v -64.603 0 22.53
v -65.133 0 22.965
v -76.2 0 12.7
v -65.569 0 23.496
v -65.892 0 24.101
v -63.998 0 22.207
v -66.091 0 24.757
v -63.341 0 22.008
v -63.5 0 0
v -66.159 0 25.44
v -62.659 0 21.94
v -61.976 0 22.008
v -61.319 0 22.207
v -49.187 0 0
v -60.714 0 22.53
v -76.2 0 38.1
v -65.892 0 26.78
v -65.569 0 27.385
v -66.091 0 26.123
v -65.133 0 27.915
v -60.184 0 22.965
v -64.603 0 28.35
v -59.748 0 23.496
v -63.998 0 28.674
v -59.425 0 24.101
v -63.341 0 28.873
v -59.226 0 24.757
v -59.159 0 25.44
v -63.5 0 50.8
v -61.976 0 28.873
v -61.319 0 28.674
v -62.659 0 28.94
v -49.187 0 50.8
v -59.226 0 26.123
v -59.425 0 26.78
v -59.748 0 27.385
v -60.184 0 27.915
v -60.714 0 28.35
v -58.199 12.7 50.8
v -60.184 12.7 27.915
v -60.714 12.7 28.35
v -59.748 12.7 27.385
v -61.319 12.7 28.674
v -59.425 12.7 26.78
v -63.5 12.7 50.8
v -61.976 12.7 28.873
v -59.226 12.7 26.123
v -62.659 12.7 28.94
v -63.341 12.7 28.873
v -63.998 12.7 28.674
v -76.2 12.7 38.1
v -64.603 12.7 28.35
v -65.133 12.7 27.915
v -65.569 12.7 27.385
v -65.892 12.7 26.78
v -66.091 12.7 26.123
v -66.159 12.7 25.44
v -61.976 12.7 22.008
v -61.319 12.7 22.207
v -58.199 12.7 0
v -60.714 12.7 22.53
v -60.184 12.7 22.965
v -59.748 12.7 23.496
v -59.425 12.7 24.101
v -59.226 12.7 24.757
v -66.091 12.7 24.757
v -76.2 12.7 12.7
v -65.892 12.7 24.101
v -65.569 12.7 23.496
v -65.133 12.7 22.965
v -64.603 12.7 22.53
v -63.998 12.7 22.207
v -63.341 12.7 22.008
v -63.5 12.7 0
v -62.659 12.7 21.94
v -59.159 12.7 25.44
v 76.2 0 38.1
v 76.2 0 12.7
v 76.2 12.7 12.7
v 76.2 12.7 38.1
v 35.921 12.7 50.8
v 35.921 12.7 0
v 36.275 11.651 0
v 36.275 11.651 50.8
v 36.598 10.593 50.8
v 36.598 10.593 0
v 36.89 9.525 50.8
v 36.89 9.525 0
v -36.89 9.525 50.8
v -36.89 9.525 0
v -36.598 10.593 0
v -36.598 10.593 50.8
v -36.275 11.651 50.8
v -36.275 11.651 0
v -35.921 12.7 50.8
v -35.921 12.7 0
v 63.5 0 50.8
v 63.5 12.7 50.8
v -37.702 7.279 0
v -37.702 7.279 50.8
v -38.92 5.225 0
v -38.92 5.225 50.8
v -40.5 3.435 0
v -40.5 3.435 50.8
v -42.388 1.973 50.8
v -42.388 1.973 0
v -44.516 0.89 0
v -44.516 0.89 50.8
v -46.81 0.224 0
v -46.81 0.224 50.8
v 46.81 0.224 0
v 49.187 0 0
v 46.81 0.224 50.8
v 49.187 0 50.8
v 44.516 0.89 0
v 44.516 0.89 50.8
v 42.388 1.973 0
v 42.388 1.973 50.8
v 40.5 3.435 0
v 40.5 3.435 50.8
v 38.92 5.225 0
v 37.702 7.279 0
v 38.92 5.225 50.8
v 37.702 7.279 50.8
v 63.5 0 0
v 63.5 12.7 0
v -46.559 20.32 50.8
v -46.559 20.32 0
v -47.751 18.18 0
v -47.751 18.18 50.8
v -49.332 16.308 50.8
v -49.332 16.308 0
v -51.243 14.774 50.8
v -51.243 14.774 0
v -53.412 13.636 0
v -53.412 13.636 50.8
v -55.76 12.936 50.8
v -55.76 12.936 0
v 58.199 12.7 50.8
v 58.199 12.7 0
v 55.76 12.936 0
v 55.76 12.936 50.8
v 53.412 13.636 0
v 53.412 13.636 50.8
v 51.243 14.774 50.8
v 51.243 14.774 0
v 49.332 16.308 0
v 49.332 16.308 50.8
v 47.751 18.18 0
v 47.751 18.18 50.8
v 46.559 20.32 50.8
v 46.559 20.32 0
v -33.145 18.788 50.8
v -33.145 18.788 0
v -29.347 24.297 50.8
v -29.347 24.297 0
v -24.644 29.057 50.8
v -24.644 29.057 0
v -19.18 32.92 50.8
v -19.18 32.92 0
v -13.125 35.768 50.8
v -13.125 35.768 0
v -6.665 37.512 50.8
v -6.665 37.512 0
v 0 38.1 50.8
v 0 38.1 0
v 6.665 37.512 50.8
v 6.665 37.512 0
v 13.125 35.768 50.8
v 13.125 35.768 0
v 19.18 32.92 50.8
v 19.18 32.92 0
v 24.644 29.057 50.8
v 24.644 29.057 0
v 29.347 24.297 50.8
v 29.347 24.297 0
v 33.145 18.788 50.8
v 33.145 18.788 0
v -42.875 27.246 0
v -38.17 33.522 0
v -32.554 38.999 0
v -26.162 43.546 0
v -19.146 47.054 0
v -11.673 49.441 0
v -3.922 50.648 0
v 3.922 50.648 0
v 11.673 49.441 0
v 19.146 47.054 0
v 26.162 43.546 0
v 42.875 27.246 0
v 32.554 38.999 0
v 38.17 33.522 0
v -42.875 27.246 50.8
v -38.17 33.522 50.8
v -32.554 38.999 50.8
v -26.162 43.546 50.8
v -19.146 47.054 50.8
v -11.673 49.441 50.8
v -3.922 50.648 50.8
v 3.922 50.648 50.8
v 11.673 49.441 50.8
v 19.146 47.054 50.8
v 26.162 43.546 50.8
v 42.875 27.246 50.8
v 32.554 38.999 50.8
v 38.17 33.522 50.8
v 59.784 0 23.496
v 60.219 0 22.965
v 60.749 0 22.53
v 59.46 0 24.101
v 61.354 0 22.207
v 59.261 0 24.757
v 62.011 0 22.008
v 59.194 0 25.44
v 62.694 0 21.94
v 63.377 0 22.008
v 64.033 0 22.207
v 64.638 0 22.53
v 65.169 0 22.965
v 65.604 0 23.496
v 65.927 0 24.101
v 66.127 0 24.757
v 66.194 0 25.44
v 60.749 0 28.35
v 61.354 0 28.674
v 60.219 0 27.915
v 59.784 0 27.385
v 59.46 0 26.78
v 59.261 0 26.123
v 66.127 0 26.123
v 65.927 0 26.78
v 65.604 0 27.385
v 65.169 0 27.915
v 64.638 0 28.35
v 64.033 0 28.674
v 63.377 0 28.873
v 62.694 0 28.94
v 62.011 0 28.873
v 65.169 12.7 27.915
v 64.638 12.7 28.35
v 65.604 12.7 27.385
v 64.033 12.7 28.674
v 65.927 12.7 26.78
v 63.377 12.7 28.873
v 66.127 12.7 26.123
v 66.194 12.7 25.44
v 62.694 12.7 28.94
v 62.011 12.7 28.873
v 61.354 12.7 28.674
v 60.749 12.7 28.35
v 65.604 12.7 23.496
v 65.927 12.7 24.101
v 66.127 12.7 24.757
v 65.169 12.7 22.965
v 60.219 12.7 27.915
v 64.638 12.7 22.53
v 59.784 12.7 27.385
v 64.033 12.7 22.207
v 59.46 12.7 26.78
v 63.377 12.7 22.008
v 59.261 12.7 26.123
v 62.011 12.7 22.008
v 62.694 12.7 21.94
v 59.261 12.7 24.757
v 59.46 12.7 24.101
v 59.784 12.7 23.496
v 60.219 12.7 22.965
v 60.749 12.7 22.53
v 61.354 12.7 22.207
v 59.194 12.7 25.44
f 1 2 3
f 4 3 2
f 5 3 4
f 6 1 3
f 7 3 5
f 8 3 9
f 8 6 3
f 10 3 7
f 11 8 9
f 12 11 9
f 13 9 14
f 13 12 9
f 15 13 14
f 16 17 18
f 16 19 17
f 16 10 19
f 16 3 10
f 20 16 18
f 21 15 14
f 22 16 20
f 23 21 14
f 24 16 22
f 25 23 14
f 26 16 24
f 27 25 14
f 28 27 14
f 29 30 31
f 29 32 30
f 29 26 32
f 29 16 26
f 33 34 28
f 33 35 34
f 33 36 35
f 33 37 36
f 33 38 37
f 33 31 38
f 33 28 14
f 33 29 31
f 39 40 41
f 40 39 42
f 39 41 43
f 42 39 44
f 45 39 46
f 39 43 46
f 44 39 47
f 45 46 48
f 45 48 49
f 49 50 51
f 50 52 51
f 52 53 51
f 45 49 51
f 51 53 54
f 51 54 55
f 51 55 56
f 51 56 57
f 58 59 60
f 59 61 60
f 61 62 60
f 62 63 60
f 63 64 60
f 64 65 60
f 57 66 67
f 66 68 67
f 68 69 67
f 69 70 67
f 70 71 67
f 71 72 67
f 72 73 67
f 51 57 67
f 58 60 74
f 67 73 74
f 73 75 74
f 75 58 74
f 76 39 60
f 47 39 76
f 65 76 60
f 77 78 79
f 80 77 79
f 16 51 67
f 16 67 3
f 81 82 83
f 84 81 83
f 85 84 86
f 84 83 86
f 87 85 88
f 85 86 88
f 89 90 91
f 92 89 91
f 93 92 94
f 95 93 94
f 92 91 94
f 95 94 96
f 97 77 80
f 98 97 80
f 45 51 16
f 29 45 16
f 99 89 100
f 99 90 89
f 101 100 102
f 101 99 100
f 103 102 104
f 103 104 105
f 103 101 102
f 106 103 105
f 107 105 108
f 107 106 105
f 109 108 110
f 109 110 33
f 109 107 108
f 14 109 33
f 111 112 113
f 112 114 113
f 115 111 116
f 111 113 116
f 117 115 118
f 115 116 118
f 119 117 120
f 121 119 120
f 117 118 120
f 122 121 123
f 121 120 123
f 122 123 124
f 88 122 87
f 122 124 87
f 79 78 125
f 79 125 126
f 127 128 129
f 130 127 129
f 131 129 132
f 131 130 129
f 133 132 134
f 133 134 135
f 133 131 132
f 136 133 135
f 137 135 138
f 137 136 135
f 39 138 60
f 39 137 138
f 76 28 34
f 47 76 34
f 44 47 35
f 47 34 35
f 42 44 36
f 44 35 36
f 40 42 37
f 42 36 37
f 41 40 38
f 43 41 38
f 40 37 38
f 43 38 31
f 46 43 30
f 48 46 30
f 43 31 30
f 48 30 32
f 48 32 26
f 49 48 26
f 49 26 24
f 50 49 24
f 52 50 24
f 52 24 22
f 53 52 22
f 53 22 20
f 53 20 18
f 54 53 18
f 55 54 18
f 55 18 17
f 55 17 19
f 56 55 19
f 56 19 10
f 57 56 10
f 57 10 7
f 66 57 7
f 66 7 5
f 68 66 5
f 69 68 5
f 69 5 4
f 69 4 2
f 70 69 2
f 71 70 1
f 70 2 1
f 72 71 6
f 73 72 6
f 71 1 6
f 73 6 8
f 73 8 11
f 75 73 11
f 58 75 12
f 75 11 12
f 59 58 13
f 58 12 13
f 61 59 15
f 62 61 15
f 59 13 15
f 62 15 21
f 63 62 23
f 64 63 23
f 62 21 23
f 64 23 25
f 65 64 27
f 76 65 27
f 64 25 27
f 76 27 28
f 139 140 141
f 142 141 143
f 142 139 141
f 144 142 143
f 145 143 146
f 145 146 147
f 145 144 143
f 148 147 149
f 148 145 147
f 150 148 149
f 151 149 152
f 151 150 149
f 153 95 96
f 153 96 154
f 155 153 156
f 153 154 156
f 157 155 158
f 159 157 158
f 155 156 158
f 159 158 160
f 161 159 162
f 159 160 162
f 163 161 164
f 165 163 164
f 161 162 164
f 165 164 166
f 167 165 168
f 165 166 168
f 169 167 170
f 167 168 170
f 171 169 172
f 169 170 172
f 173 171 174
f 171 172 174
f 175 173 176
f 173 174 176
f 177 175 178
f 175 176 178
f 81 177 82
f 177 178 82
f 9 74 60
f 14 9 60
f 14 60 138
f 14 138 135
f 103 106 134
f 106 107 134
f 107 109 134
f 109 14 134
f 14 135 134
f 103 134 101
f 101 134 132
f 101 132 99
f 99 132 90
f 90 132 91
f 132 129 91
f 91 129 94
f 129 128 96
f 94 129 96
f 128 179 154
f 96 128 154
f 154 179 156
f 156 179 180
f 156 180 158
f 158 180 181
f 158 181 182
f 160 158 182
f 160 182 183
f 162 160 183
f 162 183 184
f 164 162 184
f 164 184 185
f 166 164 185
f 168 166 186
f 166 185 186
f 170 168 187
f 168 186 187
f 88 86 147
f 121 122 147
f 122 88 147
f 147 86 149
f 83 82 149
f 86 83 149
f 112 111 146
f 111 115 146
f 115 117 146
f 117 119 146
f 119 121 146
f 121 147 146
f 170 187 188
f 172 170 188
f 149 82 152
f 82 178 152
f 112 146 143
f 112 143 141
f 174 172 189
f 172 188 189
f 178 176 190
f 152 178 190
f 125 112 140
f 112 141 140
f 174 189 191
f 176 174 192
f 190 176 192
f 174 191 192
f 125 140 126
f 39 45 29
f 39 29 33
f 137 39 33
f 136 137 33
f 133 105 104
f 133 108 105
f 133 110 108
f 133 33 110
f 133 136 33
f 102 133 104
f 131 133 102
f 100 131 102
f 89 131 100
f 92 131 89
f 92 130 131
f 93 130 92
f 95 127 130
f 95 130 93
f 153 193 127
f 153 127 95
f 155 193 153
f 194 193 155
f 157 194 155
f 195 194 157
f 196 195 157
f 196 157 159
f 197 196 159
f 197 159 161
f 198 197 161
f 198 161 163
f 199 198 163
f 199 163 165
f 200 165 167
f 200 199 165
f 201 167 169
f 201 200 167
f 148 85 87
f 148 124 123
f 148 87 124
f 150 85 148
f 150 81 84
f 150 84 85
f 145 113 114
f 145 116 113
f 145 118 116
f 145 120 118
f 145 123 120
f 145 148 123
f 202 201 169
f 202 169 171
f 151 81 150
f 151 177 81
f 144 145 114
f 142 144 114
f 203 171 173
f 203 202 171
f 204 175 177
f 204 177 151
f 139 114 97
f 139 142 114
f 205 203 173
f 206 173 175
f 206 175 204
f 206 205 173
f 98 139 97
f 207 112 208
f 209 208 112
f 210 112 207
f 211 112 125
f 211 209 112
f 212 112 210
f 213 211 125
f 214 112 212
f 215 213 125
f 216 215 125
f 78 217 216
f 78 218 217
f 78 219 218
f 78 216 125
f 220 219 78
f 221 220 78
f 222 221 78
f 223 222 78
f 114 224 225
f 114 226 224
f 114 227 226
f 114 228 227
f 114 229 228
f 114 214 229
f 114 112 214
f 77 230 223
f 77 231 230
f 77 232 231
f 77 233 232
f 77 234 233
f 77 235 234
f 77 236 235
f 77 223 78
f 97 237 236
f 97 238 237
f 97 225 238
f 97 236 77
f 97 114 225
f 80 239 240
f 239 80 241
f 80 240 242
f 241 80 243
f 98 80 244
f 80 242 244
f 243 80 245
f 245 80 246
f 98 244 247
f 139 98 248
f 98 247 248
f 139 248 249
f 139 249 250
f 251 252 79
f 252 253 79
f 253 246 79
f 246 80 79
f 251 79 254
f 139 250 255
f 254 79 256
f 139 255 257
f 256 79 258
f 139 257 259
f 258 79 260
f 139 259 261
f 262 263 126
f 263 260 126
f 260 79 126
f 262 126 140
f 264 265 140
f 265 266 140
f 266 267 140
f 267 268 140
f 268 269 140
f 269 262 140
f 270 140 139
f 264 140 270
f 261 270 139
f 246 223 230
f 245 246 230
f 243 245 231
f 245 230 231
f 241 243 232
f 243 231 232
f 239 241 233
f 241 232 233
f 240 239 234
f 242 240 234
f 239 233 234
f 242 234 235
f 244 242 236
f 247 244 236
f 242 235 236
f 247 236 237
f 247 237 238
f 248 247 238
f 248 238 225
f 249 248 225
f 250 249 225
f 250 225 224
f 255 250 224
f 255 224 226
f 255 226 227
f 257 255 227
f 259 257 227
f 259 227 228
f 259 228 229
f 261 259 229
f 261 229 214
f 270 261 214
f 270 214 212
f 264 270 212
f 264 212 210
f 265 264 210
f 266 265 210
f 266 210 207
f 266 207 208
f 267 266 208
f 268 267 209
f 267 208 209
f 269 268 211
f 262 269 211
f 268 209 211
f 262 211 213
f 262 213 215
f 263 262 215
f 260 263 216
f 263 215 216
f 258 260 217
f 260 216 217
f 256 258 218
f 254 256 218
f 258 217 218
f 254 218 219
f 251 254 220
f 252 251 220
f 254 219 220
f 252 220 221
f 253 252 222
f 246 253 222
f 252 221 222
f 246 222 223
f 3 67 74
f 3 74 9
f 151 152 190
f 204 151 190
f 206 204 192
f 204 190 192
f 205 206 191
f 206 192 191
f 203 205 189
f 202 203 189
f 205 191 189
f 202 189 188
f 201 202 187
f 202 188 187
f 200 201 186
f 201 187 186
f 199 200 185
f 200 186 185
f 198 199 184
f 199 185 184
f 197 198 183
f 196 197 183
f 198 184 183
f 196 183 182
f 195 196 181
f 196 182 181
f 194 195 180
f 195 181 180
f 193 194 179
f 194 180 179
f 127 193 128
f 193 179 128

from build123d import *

# Parameters (mm, degrees)
F1_DEPTH  = 50.8
F3_DEPTH  = 12.7
F4_SIZE   = 12.7
F5_R      = 11.35
F5_R_2    = 10
F6_DEPTH  = 44.45
F7_R      = 12.7
F8_R      = 3.5
F9_DEPTH  = 50.801
F10_W     = 183.8439181447
F10_H     = 157.3934331536
F11_DEPTH = 114.3
F12_R     = 12.7


with BuildPart() as f1:
    # F0 (on Top) → F1 (new body)
    with BuildSketch(Plane.XY):
        with BuildLine():
            ThreePointArc((-35.9210244843, 12.7), (0, 38.1), (35.9210244843, 12.7))
            Line((35.9210244843, 12.7), (49.1868884968, 12.7))
            ThreePointArc((49.1868884968, 12.7), (0, 50.8), (-49.1868884968, 12.7))
            Line((-49.1868884968, 12.7), (-35.9210244843, 12.7))
        make_face()
        with BuildLine():
            ThreePointArc((-49.1868884968, -12.7), (-50.8, 0), (-49.1868884968, 12.7))
            Line((-49.1868884968, 12.7), (-76.2, 12.7))
            Line((-76.2, 12.7), (-76.2, -12.7))
            Line((-76.2, -12.7), (-49.1868884968, -12.7))
        make_face()
        with BuildLine():
            ThreePointArc((-35.9210244843, -12.7), (-38.1, 0), (-35.9210244843, 12.7))
            Line((-35.9210244843, 12.7), (-49.1868884968, 12.7))
            ThreePointArc((-49.1868884968, 12.7), (-50.8, 0), (-49.1868884968, -12.7))
            Line((-49.1868884968, -12.7), (-35.9210244843, -12.7))
        make_face()
        with BuildLine():
            ThreePointArc((35.9210244843, 12.7), (37.5513051228, 6.4427853895), (38.1, 0))
            ThreePointArc((38.1, 0), (37.5513051228, -6.4427853895), (35.9210244843, -12.7))
            Line((35.9210244843, -12.7), (49.1868884968, -12.7))
            ThreePointArc((49.1868884968, -12.7), (50.3951085704, -6.4010180581), (50.8, 0))
            ThreePointArc((50.8, 0), (50.3951085704, 6.4010180581), (49.1868884968, 12.7))
            Line((49.1868884968, 12.7), (35.9210244843, 12.7))
        make_face()
        with BuildLine():
            Line((76.2, 12.7), (49.1868884968, 12.7))
            ThreePointArc((49.1868884968, 12.7), (50.3951085704, 6.4010180581), (50.8, 0))
            ThreePointArc((50.8, 0), (50.3951085704, -6.4010180581), (49.1868884968, -12.7))
            Line((49.1868884968, -12.7), (76.2, -12.7))
            Line((76.2, -12.7), (76.2, 12.7))
        make_face()
        with BuildLine():
            ThreePointArc((-19.05, -32.9955678842), (-29.2989914869, -24.3552683798), (-35.9210244843, -12.7))
            Line((-35.9210244843, -12.7), (-49.1868884968, -12.7))
            ThreePointArc((-49.1868884968, -12.7), (-38.2071387235, -33.479165918), (-19.05, -47.0928603931))
            Line((-19.05, -47.0928603931), (-19.05, -32.9955678842))
        make_face()
        with BuildLine():
            Line((49.1868884968, -12.7), (35.9210244843, -12.7))
            ThreePointArc((35.9210244843, -12.7), (29.2989914869, -24.3552683798), (19.05, -32.9955678842))
            Line((19.05, -32.9955678842), (19.05, -47.0928603931))
            ThreePointArc((19.05, -47.0928603931), (38.2071387235, -33.479165918), (49.1868884968, -12.7))
        make_face()
        with BuildLine():
            Line((19.05, -47.0928603931), (19.05, -32.9955678842))
            ThreePointArc((19.05, -32.9955678842), (0, -38.1), (-19.05, -32.9955678842))
            Line((-19.05, -32.9955678842), (-19.05, -47.0928603931))
            ThreePointArc((-19.05, -47.0928603931), (0, -50.8), (19.05, -47.0928603931))
        make_face()
        with BuildLine():
            Line((19.05, -88.9), (19.05, -47.0928603931))
            ThreePointArc((19.05, -47.0928603931), (0, -50.8), (-19.05, -47.0928603931))
            Line((-19.05, -47.0928603931), (-19.05, -88.9))
            Line((-19.05, -88.9), (19.05, -88.9))
        make_face()
    extrude(amount=F1_DEPTH)

    # F2 (on face) → F3 (cut)
    with BuildSketch(Plane.XZ.offset(12.7)):
        Polygon((-55.6935602012, 25.3597094836), (-59.1586096141, 31.4419321502), (-66.1584936613, 31.4822226666), (-69.6933282956, 25.4402905164), (-66.2282788827, 19.3580678498), (-59.2283948355, 19.3177773334), align=None)
        Polygon((59.1938884968, 31.4621778265), (55.6938884968, 25.4), (59.1938884968, 19.3378221735), (66.1938884968, 19.3378221735), (69.6938884968, 25.4), (66.1938884968, 31.4621778265), align=None)
    extrude(amount=-F3_DEPTH, mode=Mode.SUBTRACT)

    # F4
    f4_edges = [f1.edges().sort_by_distance(p)[0] for p in [
        (-76.2, 0, 50.8),
        (-76.2, 0, 0),
        (76.2, 0, 50.8),
        (76.2, 0, 0),
    ]]
    chamfer(f4_edges, length=F4_SIZE)

    # F5 (on face) → F6 (cut)
    with BuildSketch(Plane.XY.offset(50.8)):
        with Locations((0, -67.9964301965)):
            Circle(F5_R)
        with Locations((0, -67.9964301965)):
            Circle(F5_R_2, mode=Mode.SUBTRACT)
    extrude(amount=-F6_DEPTH, mode=Mode.SUBTRACT)

    # F7
    f7_edges = [f1.edges().sort_by_distance(p)[0] for p in [
        (-19.05, -88.9, 25.4),
        (19.05, -88.9, 25.4),
        (-19.05, -47.09286, 25.4),
        (19.05, -47.09286, 25.4),
        (49.186888, -12.7, 25.4),
        (-49.186888, -12.7, 25.4),
        (-49.186888, 12.7, 25.4),
        (49.186888, 12.7, 25.4),
    ]]
    fillet(f7_edges, radius=F7_R)

    # F8 (on face) → F9 (cut, through all)
    with BuildSketch(Plane.XZ):
        with Locations((-62.6585516377, 25.4402905164)):
            Circle(F8_R)
        with Locations((62.6938884968, 25.4402905164)):
            Circle(F8_R)
    extrude(amount=-F9_DEPTH, mode=Mode.SUBTRACT)

    # F10 (on Front) → F11 (cut)
    with BuildSketch(Plane.XZ):
        with Locations((-6.0164444149, -2.5229565799)):
            Rectangle(F10_W, F10_H)
    extrude(amount=F11_DEPTH, mode=Mode.SUBTRACT)

    # F12
    f12_edges = [f1.edges().sort_by_distance(p)[0] for p in [
        (-38.1, 0, 25.4),
        (38.1, 0, 25.4),
    ]]
    fillet(f12_edges, radius=F12_R)


solid = f1.part
